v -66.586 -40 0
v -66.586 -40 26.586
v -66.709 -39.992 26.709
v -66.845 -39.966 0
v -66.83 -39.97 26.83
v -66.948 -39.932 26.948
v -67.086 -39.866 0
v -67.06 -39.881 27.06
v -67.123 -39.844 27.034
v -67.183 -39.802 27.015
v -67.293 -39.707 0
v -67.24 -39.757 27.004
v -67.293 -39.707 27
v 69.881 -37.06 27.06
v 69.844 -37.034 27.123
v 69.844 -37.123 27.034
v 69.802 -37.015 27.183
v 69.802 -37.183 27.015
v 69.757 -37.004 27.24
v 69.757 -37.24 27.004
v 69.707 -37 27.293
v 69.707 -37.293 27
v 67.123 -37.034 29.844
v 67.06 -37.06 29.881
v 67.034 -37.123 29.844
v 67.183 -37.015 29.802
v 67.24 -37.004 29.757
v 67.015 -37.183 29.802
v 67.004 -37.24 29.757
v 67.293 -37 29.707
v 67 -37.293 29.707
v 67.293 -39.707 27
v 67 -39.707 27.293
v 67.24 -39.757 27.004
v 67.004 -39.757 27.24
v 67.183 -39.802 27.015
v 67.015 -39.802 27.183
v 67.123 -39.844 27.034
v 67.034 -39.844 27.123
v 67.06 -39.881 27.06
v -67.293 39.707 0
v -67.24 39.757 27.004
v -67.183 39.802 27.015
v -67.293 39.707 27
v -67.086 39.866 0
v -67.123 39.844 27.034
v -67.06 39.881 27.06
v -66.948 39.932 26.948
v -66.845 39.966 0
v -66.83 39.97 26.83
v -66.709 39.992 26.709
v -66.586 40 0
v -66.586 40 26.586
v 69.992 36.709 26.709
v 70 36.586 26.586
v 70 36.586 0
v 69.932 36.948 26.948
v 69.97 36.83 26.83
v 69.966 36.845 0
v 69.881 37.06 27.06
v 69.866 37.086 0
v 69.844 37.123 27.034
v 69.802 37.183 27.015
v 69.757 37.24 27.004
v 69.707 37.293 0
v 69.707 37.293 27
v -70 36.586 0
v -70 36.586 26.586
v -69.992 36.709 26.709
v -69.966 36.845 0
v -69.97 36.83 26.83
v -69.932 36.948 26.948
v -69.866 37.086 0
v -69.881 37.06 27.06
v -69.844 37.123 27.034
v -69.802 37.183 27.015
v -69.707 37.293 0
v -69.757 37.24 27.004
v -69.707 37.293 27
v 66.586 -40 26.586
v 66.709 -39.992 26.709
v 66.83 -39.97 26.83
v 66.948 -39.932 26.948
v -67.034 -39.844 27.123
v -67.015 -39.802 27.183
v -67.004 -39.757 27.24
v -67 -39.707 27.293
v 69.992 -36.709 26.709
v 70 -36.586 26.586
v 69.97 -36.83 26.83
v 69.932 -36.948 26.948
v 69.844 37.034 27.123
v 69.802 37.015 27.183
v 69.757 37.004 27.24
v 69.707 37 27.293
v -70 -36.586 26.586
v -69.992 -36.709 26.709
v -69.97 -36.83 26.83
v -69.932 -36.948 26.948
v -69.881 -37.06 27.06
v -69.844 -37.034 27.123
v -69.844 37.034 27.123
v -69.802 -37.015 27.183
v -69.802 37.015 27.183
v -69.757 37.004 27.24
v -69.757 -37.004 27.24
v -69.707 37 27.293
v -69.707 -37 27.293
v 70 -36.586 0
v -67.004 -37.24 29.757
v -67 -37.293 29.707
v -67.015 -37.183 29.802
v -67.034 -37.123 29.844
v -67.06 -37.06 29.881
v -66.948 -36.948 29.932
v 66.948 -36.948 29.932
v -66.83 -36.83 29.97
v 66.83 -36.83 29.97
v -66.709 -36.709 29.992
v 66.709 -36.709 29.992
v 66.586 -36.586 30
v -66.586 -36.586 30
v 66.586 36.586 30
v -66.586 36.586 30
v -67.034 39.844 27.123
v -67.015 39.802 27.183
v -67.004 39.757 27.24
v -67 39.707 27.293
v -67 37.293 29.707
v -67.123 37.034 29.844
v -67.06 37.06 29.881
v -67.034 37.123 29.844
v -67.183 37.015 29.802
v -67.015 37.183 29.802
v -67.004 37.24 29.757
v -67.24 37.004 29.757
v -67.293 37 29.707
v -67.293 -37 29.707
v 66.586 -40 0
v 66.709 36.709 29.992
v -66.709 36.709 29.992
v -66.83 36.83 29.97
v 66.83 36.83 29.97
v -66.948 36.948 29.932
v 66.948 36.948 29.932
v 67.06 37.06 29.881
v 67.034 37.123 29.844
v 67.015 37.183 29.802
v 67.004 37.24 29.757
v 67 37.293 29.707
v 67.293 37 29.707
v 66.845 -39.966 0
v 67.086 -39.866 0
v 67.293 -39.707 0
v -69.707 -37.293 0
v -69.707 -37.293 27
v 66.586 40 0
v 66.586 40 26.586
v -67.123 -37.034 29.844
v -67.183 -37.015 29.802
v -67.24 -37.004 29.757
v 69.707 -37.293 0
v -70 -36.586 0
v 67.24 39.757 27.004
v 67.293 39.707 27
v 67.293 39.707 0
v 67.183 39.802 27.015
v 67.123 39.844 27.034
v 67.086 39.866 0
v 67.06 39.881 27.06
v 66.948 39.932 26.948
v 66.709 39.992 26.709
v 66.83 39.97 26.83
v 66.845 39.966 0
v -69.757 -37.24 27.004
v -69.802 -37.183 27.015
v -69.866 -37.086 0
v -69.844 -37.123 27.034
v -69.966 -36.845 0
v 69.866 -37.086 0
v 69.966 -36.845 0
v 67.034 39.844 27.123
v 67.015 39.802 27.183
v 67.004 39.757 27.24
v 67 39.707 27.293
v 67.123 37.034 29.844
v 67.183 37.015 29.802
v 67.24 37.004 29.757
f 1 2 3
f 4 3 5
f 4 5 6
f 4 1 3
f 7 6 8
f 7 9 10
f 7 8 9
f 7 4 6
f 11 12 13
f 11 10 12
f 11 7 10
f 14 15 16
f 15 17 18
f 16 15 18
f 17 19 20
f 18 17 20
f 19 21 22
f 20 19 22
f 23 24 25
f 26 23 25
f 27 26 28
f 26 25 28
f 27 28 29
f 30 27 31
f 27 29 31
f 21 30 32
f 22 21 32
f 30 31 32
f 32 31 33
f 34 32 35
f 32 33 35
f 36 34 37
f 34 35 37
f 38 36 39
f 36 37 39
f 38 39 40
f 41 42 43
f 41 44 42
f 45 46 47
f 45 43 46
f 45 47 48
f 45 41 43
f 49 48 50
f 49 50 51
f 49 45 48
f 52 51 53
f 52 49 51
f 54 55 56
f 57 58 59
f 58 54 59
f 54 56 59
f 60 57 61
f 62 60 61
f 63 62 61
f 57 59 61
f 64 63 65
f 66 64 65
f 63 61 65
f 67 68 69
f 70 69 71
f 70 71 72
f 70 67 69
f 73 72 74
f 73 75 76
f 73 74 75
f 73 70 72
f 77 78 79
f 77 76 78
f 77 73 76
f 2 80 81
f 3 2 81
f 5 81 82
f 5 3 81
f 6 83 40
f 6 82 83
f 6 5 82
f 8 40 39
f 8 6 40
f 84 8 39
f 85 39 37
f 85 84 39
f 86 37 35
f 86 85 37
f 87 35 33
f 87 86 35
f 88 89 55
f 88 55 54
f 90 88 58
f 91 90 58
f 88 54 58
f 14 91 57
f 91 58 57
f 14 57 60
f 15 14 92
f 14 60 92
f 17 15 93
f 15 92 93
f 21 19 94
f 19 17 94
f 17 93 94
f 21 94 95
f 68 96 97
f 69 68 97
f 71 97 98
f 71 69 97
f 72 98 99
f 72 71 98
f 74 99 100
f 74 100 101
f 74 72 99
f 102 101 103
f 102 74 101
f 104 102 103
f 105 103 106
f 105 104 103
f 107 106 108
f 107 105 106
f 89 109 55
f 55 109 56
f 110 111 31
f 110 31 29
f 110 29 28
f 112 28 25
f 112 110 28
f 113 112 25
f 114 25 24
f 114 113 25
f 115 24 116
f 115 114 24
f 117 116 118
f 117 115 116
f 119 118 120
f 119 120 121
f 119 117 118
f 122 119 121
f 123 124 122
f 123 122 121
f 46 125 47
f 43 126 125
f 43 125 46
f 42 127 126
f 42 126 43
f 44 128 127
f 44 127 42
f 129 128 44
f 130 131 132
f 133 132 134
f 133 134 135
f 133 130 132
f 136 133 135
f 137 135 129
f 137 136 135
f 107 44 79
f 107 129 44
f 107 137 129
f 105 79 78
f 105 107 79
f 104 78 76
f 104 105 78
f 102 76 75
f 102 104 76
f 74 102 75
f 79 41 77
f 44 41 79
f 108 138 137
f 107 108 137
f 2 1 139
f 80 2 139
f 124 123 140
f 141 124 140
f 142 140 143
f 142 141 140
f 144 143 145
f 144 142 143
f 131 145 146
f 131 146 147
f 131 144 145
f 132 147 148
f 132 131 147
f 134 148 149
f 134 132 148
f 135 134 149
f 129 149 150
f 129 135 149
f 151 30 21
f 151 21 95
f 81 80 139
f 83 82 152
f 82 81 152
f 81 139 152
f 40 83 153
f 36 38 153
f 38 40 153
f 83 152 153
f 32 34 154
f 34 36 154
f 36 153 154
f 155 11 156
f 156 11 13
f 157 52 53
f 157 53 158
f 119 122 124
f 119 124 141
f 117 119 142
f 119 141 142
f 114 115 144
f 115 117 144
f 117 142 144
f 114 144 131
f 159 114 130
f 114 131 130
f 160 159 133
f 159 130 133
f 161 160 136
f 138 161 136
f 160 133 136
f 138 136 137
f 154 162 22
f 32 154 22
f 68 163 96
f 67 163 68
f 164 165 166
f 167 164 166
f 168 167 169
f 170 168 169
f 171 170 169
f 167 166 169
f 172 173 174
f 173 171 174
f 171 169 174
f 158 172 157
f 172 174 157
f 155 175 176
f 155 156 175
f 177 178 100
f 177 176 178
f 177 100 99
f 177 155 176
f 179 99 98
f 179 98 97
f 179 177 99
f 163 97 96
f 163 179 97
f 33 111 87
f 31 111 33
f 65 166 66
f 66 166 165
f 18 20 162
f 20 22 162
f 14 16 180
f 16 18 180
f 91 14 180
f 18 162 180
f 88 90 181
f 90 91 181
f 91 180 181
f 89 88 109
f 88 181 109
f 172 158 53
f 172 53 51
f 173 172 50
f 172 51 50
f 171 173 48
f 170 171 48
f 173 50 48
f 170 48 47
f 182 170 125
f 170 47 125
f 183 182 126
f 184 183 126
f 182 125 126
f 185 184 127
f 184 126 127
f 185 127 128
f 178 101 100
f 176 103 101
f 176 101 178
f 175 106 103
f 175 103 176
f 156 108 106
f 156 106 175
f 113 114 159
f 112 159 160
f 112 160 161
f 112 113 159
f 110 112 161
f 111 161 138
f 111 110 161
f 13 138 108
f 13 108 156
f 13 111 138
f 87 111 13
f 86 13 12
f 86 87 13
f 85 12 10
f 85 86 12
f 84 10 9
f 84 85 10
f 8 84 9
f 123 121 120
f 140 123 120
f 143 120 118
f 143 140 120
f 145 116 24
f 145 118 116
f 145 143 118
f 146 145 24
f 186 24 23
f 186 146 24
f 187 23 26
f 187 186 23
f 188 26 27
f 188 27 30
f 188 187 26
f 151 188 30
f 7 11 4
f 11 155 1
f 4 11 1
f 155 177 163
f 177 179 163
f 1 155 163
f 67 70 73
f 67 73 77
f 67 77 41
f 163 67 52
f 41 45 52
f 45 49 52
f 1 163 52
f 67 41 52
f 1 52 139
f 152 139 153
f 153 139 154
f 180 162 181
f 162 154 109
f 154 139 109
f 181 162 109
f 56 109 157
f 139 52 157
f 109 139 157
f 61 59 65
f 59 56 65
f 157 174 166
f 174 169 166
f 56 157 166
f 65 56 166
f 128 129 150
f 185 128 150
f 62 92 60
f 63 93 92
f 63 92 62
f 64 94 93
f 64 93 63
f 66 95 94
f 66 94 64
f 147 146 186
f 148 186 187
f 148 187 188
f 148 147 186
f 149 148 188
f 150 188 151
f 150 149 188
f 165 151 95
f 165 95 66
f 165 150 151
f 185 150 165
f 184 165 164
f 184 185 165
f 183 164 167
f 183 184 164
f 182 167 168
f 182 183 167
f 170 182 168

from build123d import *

# Parameters (mm, degrees)
F0_W        = 140
F0_H        = 80
F1_DEPTH    = 30
F2_SIZE     = 3
F3_T1_DEPTH = 29.0710678119
F3_T3_DEPTH = 136.0710678119
F3_T5_DEPTH = 76.0710678119


# Not quite as in the source:
# - a fillet or chamfer that OpenCascade refuses, or shapes differently, is made with other operations: its cross-section is extruded or revolved along the edge and cut away or added


with BuildPart() as f1:
    # F0 (on Top) → F1 (new body)
    with BuildSketch(Plane.XY):
        Rectangle(F0_W, F0_H)
    extrude(amount=F1_DEPTH)

    # F2
    f2_edges = [f1.edges().sort_by_distance(p)[0] for p in [
        (0, -40, 30),
        (-70, 0, 30),
        (0, 40, 30),
        (70, 0, 30),
        (70, -40, 15),
        (-70, -40, 15),
        (-70, 40, 15),
        (70, 40, 15),
    ]]
    chamfer(f2_edges, length=F2_SIZE)

    # F3: fillet of radius 1 on 16 edges, made by hand

    # F3_s2 → F3_t1 (cut)
    with BuildSketch(Plane.XY.offset(-1.0355339059)):
        with BuildLine():
            ThreePointArc((70, 36.5857864376), (69.9238795325, 36.96846987), (69.7071067812, 37.2928932188))
            Line((69.7071067812, 37.2928932188), (70, 37))
            Line((70, 37), (70, 36.5857864376))
        make_face()
        with BuildLine():
            ThreePointArc((67.2928932188, 39.7071067812), (66.96846987, 39.9238795325), (66.5857864376, 40))
            Line((66.5857864376, 40), (67, 40))
            Line((67, 40), (67.2928932188, 39.7071067812))
        make_face()
        with BuildLine():
            ThreePointArc((-67.2928932188, 39.7071067812), (-66.96846987, 39.9238795325), (-66.5857864376, 40))
            Line((-66.5857864376, 40), (-67, 40))
            Line((-67, 40), (-67.2928932188, 39.7071067812))
        make_face()
        with BuildLine():
            ThreePointArc((-70, 36.5857864376), (-69.9238795325, 36.96846987), (-69.7071067812, 37.2928932188))
            Line((-69.7071067812, 37.2928932188), (-70, 37))
            Line((-70, 37), (-70, 36.5857864376))
        make_face()
        with BuildLine():
            ThreePointArc((69.7071067812, -37.2928932188), (69.9238795325, -36.96846987), (70, -36.5857864376))
            Line((70, -36.5857864376), (70, -37))
            Line((70, -37), (69.7071067812, -37.2928932188))
        make_face()
        with BuildLine():
            ThreePointArc((66.5857864376, -40), (66.96846987, -39.9238795325), (67.2928932188, -39.7071067812))
            Line((67.2928932188, -39.7071067812), (67, -40))
            Line((67, -40), (66.5857864376, -40))
        make_face()
        with BuildLine():
            ThreePointArc((-69.7071067812, -37.2928932188), (-69.9238795325, -36.96846987), (-70, -36.5857864376))
            Line((-70, -36.5857864376), (-70, -37))
            Line((-70, -37), (-69.7071067812, -37.2928932188))
        make_face()
        with BuildLine():
            ThreePointArc((-66.5857864376, -40), (-66.96846987, -39.9238795325), (-67.2928932188, -39.7071067812))
            Line((-67.2928932188, -39.7071067812), (-67, -40))
            Line((-67, -40), (-66.5857864376, -40))
        make_face()
    extrude(amount=F3_T1_DEPTH, mode=Mode.SUBTRACT)

    # F3_s4 → F3_t3 (cut)
    with BuildSketch(Plane.YZ.offset(-68.0355339059)):
        with BuildLine():
            ThreePointArc((40, 26.5857864376), (39.9238795325, 26.96846987), (39.7071067812, 27.2928932188))
            Line((39.7071067812, 27.2928932188), (40, 27))
            Line((40, 27), (40, 26.5857864376))
        make_face()
        with BuildLine():
            ThreePointArc((36.5857864376, 30), (36.96846987, 29.9238795325), (37.2928932188, 29.7071067812))
            Line((37.2928932188, 29.7071067812), (37, 30))
            Line((37, 30), (36.5857864376, 30))
        make_face()
        with BuildLine():
            ThreePointArc((-37.2928932188, 29.7071067812), (-36.96846987, 29.9238795325), (-36.5857864376, 30))
            Line((-36.5857864376, 30), (-37, 30))
            Line((-37, 30), (-37.2928932188, 29.7071067812))
        make_face()
        with BuildLine():
            ThreePointArc((-40, 26.5857864376), (-39.9238795325, 26.96846987), (-39.7071067812, 27.2928932188))
            Line((-39.7071067812, 27.2928932188), (-40, 27))
            Line((-40, 27), (-40, 26.5857864376))
        make_face()
    extrude(amount=F3_T3_DEPTH, mode=Mode.SUBTRACT)

    # F3_s6 → F3_t5 (cut)
    with BuildSketch(Plane.XZ.offset(-38.0355339059)):
        with BuildLine():
            ThreePointArc((66.5857864376, 30), (66.96846987, 29.9238795325), (67.2928932188, 29.7071067812))
            Line((67.2928932188, 29.7071067812), (67, 30))
            Line((67, 30), (66.5857864376, 30))
        make_face()
        with BuildLine():
            ThreePointArc((70, 26.5857864376), (69.9238795325, 26.96846987), (69.7071067812, 27.2928932188))
            Line((69.7071067812, 27.2928932188), (70, 27))
            Line((70, 27), (70, 26.5857864376))
        make_face()
        with BuildLine():
            ThreePointArc((-66.5857864376, 30), (-66.96846987, 29.9238795325), (-67.2928932188, 29.7071067812))
            Line((-67.2928932188, 29.7071067812), (-67, 30))
            Line((-67, 30), (-66.5857864376, 30))
        make_face()
        with BuildLine():
            ThreePointArc((-70, 26.5857864376), (-69.9238795325, 26.96846987), (-69.7071067812, 27.2928932188))
            Line((-69.7071067812, 27.2928932188), (-70, 27))
            Line((-70, 27), (-70, 26.5857864376))
        make_face()
    extrude(amount=F3_T5_DEPTH, mode=Mode.SUBTRACT)


solid = f1.part
